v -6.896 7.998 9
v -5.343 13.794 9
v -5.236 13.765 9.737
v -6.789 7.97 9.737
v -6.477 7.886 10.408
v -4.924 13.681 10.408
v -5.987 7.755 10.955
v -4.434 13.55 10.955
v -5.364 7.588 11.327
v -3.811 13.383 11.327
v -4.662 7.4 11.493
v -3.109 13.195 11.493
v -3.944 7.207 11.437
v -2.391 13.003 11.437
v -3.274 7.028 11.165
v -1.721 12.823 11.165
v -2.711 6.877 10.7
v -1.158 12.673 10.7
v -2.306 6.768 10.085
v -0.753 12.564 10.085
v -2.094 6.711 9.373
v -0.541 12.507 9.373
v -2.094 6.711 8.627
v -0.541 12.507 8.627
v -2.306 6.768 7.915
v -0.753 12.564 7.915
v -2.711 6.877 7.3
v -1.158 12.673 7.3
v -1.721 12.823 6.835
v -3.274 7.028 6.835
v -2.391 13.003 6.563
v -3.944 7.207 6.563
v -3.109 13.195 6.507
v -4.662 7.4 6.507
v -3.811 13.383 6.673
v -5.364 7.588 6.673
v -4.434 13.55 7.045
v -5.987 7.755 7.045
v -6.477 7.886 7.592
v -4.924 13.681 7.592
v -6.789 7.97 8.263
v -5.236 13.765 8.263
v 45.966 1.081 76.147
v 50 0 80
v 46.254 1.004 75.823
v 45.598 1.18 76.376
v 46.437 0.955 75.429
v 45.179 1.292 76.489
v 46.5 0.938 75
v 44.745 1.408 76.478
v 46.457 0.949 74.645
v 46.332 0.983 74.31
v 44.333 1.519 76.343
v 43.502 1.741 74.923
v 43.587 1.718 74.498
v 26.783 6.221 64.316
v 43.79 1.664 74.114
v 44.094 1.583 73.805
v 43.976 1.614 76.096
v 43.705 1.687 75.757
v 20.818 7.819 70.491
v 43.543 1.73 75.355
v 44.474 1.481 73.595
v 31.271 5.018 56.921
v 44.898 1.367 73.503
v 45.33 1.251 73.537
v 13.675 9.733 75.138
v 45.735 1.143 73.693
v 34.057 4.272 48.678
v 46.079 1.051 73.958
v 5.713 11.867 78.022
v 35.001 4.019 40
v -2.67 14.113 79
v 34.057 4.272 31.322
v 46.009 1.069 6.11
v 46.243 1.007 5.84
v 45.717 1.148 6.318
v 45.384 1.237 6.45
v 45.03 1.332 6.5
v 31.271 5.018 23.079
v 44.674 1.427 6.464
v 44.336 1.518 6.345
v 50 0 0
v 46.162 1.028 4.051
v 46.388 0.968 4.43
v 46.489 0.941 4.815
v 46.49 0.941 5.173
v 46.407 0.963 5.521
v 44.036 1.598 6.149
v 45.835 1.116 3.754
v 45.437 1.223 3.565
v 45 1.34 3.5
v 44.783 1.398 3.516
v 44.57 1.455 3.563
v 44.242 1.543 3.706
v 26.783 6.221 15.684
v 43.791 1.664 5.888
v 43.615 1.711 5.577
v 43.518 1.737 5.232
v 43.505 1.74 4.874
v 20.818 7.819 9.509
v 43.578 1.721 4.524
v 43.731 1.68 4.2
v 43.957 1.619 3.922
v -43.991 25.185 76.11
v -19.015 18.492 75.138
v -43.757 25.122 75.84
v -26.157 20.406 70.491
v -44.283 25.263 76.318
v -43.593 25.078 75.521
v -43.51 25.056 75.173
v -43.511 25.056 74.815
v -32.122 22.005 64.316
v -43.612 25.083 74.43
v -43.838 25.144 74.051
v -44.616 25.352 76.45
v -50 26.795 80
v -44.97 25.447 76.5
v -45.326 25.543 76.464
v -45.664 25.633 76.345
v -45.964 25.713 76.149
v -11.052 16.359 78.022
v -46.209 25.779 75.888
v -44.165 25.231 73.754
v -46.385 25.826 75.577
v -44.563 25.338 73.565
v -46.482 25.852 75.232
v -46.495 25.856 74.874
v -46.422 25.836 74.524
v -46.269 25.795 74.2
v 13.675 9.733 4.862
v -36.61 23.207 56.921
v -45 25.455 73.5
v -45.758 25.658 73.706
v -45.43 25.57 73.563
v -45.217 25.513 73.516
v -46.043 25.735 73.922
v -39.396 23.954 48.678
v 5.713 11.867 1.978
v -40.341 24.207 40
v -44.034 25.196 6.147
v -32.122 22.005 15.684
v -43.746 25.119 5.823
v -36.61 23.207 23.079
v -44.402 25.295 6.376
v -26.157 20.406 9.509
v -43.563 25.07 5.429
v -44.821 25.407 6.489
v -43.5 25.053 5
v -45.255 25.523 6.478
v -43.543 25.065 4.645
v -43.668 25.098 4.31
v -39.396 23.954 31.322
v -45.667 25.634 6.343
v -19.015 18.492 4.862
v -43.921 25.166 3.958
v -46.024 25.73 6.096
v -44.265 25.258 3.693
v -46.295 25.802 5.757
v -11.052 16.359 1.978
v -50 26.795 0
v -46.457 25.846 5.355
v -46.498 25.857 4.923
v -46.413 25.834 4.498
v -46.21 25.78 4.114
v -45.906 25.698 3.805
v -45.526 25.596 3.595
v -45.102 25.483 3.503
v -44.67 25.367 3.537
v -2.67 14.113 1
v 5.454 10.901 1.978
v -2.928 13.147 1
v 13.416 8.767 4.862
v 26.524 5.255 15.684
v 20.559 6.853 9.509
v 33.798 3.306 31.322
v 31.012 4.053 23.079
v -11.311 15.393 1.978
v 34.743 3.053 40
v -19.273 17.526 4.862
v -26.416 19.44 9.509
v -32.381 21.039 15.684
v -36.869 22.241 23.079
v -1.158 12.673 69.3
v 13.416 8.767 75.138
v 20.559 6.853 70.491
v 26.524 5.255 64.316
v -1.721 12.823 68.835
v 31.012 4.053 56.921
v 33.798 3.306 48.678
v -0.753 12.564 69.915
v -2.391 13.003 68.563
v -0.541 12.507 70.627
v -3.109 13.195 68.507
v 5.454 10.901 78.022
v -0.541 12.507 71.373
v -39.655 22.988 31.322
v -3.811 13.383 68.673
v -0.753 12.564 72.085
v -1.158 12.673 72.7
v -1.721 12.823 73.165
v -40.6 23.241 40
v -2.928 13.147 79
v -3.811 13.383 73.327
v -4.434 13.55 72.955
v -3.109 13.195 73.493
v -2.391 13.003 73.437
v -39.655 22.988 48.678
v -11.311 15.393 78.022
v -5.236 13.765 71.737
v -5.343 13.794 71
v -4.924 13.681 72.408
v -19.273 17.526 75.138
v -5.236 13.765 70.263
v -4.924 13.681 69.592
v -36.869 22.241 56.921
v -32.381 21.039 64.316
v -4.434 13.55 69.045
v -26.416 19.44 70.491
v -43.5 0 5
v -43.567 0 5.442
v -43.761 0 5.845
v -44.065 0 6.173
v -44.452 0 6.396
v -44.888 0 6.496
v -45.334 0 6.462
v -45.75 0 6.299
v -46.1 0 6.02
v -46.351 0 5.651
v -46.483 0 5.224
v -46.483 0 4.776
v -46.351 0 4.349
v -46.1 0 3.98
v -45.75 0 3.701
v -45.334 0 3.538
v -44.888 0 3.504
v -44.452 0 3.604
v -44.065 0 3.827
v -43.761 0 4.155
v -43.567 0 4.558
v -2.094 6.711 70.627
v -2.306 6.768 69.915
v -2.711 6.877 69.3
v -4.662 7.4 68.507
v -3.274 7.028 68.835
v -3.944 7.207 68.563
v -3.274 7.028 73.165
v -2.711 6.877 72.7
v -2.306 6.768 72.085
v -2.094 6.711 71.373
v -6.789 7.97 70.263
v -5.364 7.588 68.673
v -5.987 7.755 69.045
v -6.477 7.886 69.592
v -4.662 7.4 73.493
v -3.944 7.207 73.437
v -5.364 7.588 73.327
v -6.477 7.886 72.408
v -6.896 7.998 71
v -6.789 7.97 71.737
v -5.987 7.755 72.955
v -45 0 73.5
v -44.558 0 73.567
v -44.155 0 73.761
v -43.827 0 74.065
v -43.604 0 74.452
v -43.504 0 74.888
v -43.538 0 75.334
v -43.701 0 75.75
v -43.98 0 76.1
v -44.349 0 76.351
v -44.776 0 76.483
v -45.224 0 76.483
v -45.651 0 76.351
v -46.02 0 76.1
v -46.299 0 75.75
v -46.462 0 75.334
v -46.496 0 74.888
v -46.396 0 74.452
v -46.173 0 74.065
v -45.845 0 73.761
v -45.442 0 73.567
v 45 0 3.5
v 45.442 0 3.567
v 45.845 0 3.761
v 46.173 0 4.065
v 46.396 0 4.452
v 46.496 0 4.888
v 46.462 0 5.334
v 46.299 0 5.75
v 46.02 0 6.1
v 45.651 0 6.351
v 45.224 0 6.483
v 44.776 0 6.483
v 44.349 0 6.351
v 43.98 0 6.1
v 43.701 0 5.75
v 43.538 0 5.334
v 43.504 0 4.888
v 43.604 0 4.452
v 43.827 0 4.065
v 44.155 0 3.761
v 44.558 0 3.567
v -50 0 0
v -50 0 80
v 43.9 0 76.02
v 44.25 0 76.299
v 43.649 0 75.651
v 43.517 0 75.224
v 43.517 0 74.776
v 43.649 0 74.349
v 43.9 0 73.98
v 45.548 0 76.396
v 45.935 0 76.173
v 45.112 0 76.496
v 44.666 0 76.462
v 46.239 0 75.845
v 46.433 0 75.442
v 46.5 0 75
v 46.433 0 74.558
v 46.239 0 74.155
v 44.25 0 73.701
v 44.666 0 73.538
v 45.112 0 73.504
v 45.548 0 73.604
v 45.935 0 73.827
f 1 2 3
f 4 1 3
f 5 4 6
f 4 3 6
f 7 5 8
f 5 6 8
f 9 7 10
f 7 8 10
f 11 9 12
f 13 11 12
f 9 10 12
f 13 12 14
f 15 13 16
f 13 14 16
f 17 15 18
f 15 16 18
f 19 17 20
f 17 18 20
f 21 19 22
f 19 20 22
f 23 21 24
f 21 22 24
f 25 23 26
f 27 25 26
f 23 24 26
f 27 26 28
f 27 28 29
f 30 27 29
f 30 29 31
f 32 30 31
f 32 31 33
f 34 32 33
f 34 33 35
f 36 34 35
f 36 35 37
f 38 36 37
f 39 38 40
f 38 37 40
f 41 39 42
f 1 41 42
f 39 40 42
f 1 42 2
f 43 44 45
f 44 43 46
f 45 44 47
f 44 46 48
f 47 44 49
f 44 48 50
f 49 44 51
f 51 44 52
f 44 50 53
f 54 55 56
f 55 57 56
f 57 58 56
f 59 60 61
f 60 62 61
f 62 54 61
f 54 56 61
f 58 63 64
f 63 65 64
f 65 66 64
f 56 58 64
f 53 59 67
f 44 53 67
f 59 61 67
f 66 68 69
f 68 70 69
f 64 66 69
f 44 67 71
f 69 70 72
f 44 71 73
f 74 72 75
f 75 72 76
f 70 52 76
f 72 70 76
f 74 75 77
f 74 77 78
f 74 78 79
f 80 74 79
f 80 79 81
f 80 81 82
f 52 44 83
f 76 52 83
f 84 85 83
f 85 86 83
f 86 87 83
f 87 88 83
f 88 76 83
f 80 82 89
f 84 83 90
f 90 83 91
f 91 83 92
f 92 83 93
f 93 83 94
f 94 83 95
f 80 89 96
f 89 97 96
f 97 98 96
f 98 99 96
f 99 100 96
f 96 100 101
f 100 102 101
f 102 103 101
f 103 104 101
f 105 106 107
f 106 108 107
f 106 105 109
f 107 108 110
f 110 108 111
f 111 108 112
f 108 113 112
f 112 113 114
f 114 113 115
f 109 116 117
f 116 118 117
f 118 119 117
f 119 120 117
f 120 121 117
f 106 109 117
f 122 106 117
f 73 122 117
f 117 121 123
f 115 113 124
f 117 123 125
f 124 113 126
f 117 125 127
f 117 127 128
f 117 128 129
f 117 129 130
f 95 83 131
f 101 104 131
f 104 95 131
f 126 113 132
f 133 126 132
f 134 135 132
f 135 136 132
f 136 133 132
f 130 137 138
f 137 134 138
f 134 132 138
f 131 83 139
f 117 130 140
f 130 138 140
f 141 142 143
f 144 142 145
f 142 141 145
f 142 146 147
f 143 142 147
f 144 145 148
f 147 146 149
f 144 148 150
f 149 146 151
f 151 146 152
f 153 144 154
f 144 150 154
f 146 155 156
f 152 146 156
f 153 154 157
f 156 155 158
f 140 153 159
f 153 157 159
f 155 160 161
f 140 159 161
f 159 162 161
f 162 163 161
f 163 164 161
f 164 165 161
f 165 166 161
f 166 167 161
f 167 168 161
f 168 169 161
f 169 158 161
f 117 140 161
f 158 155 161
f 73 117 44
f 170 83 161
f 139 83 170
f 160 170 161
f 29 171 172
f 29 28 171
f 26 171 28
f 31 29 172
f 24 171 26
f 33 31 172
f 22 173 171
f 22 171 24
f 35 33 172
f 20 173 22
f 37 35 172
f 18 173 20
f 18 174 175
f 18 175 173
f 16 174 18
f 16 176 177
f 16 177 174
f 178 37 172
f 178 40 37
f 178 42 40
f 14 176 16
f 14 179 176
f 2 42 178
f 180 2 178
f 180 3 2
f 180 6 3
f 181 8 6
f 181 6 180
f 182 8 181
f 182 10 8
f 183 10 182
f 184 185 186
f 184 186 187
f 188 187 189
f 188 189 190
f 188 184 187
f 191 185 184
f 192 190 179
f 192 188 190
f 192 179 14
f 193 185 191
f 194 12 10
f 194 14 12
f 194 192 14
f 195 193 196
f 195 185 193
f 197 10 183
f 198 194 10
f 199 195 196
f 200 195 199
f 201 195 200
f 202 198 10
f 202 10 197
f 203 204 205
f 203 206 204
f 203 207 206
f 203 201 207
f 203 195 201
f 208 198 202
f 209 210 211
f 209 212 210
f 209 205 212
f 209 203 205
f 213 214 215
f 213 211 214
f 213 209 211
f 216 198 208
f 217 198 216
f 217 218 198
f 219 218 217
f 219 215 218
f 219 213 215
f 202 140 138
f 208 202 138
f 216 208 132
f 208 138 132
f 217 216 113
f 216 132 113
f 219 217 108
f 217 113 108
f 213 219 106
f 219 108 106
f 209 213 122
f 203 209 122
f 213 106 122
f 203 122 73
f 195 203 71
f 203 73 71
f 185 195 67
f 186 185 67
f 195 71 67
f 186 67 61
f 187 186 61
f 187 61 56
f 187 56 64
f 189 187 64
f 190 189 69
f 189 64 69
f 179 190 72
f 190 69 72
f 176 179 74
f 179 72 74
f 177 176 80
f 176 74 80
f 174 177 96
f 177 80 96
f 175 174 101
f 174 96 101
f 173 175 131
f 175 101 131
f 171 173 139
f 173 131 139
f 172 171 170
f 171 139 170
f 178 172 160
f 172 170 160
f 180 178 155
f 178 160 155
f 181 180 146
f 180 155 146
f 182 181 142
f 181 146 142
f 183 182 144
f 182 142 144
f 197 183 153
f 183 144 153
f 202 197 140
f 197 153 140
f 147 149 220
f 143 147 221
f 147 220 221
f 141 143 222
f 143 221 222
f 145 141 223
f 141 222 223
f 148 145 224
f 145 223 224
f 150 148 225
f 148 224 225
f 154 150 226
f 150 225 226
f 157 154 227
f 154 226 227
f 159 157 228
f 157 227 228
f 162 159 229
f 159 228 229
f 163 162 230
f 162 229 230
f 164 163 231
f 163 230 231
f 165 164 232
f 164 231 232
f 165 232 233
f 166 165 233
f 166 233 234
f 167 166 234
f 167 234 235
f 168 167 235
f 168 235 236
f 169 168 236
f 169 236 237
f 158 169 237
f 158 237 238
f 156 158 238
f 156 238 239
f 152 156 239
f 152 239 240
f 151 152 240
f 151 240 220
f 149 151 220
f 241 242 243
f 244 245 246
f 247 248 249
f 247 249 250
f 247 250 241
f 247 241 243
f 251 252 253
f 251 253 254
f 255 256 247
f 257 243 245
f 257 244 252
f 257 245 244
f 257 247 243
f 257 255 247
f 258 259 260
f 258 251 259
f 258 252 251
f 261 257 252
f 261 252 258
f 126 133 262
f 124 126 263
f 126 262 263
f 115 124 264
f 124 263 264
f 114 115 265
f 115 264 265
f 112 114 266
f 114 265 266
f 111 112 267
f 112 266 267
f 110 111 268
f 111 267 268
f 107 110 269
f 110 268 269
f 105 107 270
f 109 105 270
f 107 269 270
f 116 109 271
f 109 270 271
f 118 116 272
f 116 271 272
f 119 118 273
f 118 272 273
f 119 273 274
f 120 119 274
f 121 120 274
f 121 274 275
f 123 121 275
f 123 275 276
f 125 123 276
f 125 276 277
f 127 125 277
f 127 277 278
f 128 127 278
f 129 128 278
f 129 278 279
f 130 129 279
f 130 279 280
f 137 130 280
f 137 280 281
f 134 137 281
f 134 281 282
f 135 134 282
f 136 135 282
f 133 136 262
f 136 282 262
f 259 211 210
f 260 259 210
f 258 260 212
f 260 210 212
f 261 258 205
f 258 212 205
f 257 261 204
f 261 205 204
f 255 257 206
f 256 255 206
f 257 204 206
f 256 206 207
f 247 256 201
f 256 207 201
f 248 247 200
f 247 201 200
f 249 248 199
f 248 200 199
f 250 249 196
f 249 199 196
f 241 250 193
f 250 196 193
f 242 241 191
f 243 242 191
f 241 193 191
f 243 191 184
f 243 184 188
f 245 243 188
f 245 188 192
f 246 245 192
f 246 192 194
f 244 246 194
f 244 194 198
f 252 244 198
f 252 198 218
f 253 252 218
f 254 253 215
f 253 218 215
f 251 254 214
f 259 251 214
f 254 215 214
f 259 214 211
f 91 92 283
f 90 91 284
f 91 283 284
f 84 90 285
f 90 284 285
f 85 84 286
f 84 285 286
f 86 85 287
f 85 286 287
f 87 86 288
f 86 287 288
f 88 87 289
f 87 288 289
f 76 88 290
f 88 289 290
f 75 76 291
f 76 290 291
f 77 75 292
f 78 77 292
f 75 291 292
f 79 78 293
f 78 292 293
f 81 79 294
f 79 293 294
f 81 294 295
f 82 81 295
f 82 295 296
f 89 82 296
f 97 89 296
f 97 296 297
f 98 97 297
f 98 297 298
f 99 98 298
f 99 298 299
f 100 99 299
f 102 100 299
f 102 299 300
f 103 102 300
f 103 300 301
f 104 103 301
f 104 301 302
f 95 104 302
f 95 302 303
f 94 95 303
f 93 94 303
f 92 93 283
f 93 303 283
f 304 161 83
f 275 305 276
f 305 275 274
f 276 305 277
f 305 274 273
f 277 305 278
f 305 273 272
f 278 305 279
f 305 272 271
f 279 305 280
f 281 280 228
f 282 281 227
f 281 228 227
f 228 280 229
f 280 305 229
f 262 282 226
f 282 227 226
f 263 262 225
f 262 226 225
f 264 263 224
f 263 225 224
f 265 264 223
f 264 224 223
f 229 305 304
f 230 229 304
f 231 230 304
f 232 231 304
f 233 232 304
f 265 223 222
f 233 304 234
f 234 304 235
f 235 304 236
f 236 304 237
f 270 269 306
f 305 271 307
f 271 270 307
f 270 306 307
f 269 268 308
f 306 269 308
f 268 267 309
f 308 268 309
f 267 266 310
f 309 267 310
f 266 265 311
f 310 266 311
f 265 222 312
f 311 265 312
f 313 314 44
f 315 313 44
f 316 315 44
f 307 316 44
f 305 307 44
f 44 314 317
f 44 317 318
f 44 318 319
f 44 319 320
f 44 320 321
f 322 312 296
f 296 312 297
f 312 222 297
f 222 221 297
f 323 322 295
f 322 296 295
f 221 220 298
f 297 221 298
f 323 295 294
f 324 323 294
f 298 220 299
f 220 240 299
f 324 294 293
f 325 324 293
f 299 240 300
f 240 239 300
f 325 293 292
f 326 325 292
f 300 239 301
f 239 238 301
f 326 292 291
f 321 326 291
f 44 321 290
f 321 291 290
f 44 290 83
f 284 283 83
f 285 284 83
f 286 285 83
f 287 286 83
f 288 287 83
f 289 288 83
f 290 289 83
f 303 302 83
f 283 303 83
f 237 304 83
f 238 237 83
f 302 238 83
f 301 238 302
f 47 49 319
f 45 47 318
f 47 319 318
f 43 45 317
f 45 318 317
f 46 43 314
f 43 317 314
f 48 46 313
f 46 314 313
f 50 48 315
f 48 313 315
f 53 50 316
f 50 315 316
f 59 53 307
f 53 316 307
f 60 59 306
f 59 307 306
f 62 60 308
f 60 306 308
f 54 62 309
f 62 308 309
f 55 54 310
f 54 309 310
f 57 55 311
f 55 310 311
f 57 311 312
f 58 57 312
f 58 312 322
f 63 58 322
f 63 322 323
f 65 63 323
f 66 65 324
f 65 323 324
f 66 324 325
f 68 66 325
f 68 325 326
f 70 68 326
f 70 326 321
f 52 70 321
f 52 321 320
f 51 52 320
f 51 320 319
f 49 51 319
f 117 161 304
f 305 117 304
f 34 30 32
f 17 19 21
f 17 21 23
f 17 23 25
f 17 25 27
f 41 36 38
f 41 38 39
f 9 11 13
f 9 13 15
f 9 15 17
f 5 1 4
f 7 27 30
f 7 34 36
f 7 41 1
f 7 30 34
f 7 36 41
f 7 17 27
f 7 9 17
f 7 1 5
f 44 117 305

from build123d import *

# Parameters (mm, degrees)
SALIENTE_EXTRUIR1_DEPTH = 80
CROQUIS2_R              = 39
CORTAR_EXTRUIR1_DEPTH   = 1
CROQUIS3_R              = 2.5
CORTAR_EXTRUIR2_DEPTH   = 6
CROQUIS5_R              = 1.5
CORTAR_EXTRUIR3_DEPTH   = 40


with BuildPart() as part:
    # Croquis1 → Saliente-Extruir1 (new body)
    with BuildSketch(Plane.XY):
        Polygon((-50, 0), (50, 0), (-50, 26.794919243), align=None)
    extrude(amount=SALIENTE_EXTRUIR1_DEPTH)

    # Croquis2 → Cortar-Extruir1 (cut)
    with BuildSketch(Plane(origin=(3.349364905, 12.5, 0), x_dir=(0.96592582628907, -0.2588190451025143, 0), z_dir=(0.2588190451025143, 0.96592582628907, 0))):
        with Locations(Location((-6.231326727, -40, 0), (0, 0, 180))):
            Circle(CROQUIS2_R)
    extrude(amount=-CORTAR_EXTRUIR1_DEPTH, mode=Mode.SUBTRACT)

    # Croquis3 → Cortar-Extruir2 (cut)
    with BuildSketch(Plane(origin=(3.09054586, 11.534074174, 0), x_dir=(0.96592582628907, -0.2588190451025143, 0), z_dir=(0.2588190451025143, 0.96592582628907, 0))):
        with Locations(Location((-6.231326727, -9, 0), (0, 0, 180))):
            Circle(CROQUIS3_R)
        with Locations(Location((-6.231326727, -71, 0), (0, 0, 180))):
            Circle(CROQUIS3_R)
    extrude(amount=-CORTAR_EXTRUIR2_DEPTH, mode=Mode.SUBTRACT)

    # Croquis5 → Cortar-Extruir3 (cut)
    with BuildSketch(Plane.XZ):
        with Locations(Location((-45, 75, 0), (0, 0, 270))):
            Circle(CROQUIS5_R)
        with Locations((45, 75)):
            Circle(CROQUIS5_R)
        with Locations(Location((45, 5, 0), (0, 0, 270))):
            Circle(CROQUIS5_R)
        with Locations((-45, 5)):
            Circle(CROQUIS5_R)
    extrude(amount=-CORTAR_EXTRUIR3_DEPTH, mode=Mode.SUBTRACT)


solid = part.part
